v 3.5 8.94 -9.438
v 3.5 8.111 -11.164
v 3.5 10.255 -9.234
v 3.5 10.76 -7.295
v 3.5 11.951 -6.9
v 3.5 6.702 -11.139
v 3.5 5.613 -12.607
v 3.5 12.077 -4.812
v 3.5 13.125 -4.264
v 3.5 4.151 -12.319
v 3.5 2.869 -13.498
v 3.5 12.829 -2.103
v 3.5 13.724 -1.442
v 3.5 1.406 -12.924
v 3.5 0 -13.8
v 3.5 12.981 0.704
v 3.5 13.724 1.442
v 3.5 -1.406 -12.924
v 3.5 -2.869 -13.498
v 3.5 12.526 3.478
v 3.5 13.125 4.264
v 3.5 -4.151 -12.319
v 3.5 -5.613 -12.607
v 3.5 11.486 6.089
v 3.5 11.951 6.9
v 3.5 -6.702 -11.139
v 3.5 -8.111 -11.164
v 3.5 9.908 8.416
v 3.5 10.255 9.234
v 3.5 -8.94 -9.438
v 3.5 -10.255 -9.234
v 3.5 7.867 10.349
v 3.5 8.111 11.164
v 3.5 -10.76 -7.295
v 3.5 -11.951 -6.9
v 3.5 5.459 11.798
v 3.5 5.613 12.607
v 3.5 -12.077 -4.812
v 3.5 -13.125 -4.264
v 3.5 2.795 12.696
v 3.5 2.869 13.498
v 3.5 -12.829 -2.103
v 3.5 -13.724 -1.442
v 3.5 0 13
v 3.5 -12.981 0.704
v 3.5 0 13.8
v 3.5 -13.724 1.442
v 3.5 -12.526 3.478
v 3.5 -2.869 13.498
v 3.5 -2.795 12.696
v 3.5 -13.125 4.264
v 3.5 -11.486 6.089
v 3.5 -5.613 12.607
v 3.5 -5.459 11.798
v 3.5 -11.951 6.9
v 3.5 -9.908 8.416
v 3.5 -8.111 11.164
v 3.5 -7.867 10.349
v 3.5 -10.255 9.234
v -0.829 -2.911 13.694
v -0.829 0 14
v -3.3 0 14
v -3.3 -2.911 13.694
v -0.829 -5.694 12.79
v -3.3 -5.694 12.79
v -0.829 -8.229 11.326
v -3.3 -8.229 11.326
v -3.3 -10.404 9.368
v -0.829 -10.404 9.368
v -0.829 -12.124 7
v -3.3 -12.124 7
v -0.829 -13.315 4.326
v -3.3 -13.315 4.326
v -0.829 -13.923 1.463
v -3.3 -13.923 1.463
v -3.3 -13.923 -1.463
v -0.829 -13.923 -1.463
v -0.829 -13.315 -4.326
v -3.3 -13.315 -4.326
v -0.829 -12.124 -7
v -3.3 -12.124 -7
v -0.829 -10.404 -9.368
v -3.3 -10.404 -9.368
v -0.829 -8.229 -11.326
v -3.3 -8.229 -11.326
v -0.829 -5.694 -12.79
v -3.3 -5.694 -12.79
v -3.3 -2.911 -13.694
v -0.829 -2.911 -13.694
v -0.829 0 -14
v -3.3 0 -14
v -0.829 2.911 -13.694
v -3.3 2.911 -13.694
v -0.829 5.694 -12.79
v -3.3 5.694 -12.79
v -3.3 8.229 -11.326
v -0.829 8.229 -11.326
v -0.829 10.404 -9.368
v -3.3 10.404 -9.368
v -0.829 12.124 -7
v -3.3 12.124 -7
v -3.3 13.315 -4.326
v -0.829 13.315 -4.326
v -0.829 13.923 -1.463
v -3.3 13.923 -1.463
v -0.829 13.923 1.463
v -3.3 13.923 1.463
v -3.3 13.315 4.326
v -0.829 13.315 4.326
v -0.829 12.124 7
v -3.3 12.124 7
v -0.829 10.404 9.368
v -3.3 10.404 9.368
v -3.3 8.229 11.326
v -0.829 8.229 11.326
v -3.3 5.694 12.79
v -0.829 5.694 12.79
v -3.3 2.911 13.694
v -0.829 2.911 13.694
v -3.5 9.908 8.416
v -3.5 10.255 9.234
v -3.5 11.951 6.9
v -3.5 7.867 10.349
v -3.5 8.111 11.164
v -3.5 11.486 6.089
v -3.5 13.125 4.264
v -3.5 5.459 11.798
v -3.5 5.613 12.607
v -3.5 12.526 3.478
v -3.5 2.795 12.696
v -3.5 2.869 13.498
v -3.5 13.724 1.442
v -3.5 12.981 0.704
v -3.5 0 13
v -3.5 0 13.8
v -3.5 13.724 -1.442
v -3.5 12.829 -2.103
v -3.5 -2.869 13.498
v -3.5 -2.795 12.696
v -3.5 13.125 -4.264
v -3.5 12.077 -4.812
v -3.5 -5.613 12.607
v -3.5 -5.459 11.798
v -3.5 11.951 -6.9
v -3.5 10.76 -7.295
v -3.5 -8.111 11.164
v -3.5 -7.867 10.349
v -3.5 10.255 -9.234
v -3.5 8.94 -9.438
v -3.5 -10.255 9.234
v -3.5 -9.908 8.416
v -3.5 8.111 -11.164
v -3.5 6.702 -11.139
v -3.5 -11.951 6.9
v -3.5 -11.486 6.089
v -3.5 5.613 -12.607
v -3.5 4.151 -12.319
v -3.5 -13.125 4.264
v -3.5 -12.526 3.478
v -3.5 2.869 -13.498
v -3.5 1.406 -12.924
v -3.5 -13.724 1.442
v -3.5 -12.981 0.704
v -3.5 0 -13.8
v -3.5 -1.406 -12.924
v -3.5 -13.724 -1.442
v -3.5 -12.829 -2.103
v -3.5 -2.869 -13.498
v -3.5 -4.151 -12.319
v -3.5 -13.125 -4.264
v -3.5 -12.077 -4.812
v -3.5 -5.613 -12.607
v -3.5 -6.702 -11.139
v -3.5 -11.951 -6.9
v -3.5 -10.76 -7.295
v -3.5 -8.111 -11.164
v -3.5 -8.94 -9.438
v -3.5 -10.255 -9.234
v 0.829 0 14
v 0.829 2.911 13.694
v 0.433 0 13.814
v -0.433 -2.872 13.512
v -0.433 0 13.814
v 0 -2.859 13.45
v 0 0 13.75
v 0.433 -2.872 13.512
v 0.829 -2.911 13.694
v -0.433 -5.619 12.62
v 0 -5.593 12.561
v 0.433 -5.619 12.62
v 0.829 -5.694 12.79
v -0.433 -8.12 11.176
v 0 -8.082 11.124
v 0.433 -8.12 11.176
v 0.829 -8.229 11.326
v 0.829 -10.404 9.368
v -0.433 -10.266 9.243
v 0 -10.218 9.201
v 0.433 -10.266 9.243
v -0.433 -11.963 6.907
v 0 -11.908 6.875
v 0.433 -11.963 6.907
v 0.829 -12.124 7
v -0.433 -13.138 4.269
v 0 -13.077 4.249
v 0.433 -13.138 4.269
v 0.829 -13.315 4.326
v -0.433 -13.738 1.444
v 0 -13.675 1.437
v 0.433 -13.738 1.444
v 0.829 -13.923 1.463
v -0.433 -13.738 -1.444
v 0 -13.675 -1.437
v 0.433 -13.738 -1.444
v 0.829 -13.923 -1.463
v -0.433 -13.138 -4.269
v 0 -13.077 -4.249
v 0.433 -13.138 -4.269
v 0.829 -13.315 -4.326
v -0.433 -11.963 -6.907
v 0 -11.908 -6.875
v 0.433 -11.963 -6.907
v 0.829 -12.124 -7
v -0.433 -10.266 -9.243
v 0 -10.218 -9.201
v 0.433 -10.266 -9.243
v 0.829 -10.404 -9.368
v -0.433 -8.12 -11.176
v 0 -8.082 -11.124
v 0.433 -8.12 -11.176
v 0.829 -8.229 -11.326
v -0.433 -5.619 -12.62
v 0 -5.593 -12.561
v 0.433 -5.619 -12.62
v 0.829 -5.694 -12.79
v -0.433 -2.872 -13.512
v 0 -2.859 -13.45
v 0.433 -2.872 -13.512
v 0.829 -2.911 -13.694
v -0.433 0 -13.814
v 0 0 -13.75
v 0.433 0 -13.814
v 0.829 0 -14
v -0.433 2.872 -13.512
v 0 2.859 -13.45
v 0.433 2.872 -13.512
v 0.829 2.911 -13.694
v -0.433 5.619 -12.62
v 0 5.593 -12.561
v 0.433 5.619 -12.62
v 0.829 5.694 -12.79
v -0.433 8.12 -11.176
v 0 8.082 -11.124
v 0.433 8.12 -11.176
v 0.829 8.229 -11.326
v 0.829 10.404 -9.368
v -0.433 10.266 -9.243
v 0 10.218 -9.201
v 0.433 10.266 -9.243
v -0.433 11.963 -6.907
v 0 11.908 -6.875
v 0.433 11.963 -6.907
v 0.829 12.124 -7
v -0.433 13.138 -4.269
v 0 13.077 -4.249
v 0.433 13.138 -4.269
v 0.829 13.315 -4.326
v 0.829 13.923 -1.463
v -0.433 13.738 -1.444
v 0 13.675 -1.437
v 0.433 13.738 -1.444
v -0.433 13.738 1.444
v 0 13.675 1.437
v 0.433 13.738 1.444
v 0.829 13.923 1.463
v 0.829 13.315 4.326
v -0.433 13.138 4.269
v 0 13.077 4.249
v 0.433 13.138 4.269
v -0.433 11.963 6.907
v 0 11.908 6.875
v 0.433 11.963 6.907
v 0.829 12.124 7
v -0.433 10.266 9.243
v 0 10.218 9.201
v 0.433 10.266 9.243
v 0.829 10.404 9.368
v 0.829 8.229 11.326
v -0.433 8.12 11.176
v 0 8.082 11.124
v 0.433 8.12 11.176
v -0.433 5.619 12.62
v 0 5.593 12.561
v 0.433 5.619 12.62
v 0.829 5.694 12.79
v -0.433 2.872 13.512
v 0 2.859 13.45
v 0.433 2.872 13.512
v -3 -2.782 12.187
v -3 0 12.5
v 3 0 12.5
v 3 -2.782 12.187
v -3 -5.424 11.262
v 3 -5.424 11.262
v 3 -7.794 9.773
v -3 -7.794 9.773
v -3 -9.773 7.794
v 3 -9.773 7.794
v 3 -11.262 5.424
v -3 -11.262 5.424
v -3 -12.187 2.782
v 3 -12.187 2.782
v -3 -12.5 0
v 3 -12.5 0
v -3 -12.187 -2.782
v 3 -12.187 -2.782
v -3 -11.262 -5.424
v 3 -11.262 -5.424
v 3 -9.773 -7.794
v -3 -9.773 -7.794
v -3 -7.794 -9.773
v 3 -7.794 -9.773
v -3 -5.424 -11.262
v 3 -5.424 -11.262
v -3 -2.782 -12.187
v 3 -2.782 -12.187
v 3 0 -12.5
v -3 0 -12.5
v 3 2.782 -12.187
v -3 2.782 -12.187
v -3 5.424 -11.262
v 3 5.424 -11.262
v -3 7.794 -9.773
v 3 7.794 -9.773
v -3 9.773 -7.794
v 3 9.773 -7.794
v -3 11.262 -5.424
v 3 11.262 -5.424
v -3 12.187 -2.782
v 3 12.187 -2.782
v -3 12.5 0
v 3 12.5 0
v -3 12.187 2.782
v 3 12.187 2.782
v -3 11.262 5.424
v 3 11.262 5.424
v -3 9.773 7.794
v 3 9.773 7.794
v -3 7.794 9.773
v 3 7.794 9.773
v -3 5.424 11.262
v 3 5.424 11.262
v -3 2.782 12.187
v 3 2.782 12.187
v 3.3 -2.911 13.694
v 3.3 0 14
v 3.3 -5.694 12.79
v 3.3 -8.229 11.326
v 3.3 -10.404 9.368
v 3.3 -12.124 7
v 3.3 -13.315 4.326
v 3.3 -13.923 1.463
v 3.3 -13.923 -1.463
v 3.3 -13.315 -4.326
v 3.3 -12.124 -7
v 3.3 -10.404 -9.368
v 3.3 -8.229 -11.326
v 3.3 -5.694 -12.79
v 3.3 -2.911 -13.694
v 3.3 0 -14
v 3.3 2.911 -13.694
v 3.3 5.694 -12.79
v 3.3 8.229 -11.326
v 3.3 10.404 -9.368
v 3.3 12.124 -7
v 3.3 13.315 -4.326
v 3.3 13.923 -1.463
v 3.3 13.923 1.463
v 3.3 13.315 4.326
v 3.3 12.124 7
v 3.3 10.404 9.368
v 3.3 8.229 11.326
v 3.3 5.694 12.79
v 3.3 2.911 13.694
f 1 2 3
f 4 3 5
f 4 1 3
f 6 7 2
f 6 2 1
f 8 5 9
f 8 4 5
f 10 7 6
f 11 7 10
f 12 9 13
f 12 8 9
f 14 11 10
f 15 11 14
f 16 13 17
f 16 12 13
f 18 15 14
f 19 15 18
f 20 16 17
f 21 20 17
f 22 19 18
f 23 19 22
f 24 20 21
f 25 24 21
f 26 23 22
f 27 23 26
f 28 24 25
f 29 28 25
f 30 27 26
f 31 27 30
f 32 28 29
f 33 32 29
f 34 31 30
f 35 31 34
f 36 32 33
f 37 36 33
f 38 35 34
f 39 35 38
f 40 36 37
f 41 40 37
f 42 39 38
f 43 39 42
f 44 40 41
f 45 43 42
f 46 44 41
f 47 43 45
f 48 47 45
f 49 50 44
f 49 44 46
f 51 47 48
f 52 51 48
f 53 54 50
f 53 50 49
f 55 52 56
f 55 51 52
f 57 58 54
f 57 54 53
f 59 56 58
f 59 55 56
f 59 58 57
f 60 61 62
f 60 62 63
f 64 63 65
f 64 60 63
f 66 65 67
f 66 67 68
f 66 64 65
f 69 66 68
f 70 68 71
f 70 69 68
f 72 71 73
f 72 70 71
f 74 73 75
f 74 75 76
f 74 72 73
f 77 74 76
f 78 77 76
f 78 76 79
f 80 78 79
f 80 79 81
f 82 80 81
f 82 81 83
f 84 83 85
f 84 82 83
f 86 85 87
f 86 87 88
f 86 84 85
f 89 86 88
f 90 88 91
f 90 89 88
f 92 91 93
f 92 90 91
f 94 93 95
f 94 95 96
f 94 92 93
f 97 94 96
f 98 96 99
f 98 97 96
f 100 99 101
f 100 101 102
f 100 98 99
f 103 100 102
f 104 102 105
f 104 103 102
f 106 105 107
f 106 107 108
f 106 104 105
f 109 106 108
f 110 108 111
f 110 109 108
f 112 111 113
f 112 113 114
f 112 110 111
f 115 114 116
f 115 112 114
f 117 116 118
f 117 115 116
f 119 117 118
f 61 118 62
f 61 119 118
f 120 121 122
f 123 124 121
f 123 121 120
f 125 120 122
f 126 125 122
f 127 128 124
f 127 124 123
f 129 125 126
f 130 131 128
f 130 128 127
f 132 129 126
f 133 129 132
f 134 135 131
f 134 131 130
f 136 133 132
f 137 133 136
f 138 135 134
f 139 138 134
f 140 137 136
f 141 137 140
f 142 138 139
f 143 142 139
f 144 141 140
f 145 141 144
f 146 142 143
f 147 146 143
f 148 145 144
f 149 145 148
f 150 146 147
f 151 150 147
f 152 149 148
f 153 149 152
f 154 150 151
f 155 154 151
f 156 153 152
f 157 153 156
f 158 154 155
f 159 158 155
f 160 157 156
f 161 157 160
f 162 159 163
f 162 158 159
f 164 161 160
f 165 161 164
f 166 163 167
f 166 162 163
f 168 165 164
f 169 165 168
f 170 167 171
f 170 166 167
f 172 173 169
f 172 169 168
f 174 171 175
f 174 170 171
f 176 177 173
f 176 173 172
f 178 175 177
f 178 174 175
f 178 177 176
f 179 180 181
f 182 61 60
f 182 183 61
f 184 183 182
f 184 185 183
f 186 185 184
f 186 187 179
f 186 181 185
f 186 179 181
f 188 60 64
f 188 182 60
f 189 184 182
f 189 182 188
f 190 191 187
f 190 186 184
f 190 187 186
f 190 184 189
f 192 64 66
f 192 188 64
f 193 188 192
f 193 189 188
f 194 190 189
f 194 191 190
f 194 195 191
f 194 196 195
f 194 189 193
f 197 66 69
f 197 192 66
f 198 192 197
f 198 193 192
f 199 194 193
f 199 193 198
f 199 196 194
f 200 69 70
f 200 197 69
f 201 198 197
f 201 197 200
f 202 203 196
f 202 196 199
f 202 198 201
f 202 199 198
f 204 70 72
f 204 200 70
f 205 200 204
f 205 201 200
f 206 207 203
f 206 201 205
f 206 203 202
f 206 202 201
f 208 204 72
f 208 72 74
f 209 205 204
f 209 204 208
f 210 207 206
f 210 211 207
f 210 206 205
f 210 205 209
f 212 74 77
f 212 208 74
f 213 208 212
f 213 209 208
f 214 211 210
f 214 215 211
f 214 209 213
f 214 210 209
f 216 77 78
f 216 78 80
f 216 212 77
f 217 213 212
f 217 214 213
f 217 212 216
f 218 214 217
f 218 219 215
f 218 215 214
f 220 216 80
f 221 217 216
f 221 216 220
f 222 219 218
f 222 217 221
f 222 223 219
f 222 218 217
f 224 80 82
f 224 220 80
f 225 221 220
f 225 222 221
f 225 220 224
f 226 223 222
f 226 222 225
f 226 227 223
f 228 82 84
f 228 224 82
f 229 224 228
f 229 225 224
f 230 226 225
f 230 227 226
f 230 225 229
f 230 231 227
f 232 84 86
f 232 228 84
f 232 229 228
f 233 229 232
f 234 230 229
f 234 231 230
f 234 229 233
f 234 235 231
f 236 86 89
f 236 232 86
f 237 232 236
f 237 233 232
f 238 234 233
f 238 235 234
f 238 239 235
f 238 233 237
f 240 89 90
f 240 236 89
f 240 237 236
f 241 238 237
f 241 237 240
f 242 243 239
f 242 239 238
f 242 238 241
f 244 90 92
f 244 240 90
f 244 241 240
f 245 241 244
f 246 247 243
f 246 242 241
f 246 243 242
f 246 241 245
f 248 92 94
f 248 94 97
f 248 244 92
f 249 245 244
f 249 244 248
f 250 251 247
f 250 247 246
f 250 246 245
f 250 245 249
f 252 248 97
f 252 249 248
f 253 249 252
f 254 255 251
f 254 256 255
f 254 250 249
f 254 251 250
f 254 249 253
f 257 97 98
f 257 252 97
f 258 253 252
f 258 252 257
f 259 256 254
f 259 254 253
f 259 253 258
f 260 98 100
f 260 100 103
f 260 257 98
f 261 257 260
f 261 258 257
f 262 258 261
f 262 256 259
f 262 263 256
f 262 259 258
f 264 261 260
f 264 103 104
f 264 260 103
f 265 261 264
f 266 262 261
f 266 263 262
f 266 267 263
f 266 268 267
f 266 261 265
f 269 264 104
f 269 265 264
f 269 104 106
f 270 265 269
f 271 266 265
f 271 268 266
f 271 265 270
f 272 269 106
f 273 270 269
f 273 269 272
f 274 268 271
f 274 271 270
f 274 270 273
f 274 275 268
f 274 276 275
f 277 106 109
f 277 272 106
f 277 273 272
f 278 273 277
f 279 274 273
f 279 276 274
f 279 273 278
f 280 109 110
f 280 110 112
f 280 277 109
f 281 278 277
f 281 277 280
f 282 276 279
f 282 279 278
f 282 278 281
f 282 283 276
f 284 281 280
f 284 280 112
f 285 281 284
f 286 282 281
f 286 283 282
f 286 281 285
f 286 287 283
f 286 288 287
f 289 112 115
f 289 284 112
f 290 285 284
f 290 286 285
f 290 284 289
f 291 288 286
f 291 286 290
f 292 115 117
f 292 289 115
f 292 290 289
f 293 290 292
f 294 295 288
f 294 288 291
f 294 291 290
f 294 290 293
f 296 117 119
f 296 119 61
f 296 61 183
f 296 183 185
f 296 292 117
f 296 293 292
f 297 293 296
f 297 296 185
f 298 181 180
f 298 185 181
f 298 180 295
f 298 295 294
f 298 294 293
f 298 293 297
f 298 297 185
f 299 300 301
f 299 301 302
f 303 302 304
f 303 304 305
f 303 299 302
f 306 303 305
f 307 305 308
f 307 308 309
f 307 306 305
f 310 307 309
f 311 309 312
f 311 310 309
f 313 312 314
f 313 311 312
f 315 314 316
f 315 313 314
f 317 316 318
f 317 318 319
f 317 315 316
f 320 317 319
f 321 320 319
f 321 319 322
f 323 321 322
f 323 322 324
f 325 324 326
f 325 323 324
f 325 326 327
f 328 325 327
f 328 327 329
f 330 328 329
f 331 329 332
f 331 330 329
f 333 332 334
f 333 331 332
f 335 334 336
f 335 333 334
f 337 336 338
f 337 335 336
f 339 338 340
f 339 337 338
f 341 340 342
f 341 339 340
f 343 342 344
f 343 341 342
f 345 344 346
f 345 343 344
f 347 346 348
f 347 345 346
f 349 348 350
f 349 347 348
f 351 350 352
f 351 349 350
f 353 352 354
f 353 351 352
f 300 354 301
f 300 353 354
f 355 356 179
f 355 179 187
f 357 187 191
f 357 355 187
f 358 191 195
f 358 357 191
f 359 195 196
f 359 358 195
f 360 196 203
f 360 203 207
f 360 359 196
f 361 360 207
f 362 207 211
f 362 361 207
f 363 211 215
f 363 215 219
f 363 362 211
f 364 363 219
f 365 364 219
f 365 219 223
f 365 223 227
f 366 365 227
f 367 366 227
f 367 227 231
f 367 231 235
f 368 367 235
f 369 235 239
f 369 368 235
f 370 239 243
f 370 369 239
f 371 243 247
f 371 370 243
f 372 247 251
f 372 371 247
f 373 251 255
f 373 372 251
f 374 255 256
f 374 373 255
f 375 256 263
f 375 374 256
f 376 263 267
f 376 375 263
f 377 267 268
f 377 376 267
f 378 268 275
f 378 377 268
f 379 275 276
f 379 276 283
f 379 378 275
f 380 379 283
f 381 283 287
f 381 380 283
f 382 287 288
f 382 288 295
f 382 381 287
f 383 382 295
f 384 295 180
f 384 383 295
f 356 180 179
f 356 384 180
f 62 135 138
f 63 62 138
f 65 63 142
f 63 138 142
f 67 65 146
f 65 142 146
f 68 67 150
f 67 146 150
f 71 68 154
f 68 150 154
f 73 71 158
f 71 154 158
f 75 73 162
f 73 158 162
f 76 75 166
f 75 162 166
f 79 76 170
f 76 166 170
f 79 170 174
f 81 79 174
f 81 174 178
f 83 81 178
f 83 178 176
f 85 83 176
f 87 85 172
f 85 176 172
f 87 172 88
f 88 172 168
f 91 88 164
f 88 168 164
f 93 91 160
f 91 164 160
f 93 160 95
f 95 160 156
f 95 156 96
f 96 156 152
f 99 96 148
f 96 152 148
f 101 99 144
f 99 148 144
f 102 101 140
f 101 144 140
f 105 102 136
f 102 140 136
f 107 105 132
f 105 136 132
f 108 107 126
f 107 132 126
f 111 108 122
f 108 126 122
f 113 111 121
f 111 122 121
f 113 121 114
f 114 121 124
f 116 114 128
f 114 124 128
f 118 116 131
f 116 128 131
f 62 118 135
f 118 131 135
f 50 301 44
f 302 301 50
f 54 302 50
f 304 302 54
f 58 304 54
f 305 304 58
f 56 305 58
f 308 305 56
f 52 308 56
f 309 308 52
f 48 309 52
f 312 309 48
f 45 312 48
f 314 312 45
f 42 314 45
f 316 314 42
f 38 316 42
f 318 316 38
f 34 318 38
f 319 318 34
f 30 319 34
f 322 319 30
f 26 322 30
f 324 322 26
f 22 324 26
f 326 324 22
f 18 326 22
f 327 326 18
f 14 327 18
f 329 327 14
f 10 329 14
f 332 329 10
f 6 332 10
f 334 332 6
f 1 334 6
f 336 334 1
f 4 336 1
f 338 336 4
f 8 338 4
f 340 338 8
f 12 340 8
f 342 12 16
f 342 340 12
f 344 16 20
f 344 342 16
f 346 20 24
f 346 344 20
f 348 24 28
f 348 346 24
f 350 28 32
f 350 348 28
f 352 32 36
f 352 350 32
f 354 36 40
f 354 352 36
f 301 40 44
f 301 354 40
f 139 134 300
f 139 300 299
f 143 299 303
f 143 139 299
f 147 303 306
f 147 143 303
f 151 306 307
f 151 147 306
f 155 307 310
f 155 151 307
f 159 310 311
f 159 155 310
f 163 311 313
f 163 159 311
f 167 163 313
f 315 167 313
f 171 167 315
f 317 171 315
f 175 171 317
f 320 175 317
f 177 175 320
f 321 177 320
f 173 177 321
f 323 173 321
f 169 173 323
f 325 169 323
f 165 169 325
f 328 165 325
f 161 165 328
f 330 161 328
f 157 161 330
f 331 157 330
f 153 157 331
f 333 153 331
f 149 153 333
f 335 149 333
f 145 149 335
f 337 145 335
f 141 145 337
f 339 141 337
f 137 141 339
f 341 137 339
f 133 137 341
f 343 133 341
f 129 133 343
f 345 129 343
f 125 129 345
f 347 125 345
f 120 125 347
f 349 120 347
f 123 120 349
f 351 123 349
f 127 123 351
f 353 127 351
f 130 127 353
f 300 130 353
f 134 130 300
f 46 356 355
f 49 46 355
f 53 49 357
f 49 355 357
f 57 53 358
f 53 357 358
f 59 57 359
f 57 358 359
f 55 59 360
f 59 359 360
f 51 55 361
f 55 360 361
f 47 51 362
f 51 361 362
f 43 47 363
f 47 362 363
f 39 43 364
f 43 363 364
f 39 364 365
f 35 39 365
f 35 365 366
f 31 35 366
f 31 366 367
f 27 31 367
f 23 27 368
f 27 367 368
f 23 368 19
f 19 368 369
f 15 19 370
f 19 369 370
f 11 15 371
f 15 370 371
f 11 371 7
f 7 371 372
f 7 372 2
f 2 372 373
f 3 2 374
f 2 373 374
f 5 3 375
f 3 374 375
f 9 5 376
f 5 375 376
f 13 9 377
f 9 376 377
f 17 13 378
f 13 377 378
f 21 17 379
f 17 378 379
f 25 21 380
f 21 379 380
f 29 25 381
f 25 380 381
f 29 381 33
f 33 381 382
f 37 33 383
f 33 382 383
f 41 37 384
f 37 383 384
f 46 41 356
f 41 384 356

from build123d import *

# Parameters (mm, degrees)
CHAMFER_1_SIZE = 0.5
CHAMFER_2_SIZE = 0.2


with BuildPart() as part:
    # Эскиз1 → Повернуть1 (revolve)
    with BuildSketch(Plane.XY, mode=Mode.PRIVATE) as revolve_1_sk:
        with BuildLine():
            Line((0.829156198, 14), (3.5, 14))
            Line((3.5, 14), (3.5, 12.5))
            Line((3.5, 12.5), (-3.5, 12.5))
            Line((-3.5, 12.5), (-3.5, 14))
            Line((-3.5, 14), (-0.829156198, 14))
            ThreePointArc((-0.829156198, 14), (0, 13.75), (0.829156198, 14))
        make_face()
    revolve(revolve_1_sk.sketch.rotate(Axis((0, 0, 0), (1, 0, 0)), 90), axis=Axis((0, 0, 0), (1, 0, 0)))

    # Фаска1
    chamfer_1_edges = [part.edges().sort_by_distance(p)[0] for p in [
        (3.5, 0, -12.5),
        (-3.5, 0, -12.5),
    ]]
    chamfer(chamfer_1_edges, length=CHAMFER_1_SIZE)

    # Фаска2
    chamfer_2_edges = [part.edges().sort_by_distance(p)[0] for p in [
        (-3.5, 0, -14),
        (3.5, 0, -14),
    ]]
    chamfer(chamfer_2_edges, length=CHAMFER_2_SIZE)


solid = part.part
